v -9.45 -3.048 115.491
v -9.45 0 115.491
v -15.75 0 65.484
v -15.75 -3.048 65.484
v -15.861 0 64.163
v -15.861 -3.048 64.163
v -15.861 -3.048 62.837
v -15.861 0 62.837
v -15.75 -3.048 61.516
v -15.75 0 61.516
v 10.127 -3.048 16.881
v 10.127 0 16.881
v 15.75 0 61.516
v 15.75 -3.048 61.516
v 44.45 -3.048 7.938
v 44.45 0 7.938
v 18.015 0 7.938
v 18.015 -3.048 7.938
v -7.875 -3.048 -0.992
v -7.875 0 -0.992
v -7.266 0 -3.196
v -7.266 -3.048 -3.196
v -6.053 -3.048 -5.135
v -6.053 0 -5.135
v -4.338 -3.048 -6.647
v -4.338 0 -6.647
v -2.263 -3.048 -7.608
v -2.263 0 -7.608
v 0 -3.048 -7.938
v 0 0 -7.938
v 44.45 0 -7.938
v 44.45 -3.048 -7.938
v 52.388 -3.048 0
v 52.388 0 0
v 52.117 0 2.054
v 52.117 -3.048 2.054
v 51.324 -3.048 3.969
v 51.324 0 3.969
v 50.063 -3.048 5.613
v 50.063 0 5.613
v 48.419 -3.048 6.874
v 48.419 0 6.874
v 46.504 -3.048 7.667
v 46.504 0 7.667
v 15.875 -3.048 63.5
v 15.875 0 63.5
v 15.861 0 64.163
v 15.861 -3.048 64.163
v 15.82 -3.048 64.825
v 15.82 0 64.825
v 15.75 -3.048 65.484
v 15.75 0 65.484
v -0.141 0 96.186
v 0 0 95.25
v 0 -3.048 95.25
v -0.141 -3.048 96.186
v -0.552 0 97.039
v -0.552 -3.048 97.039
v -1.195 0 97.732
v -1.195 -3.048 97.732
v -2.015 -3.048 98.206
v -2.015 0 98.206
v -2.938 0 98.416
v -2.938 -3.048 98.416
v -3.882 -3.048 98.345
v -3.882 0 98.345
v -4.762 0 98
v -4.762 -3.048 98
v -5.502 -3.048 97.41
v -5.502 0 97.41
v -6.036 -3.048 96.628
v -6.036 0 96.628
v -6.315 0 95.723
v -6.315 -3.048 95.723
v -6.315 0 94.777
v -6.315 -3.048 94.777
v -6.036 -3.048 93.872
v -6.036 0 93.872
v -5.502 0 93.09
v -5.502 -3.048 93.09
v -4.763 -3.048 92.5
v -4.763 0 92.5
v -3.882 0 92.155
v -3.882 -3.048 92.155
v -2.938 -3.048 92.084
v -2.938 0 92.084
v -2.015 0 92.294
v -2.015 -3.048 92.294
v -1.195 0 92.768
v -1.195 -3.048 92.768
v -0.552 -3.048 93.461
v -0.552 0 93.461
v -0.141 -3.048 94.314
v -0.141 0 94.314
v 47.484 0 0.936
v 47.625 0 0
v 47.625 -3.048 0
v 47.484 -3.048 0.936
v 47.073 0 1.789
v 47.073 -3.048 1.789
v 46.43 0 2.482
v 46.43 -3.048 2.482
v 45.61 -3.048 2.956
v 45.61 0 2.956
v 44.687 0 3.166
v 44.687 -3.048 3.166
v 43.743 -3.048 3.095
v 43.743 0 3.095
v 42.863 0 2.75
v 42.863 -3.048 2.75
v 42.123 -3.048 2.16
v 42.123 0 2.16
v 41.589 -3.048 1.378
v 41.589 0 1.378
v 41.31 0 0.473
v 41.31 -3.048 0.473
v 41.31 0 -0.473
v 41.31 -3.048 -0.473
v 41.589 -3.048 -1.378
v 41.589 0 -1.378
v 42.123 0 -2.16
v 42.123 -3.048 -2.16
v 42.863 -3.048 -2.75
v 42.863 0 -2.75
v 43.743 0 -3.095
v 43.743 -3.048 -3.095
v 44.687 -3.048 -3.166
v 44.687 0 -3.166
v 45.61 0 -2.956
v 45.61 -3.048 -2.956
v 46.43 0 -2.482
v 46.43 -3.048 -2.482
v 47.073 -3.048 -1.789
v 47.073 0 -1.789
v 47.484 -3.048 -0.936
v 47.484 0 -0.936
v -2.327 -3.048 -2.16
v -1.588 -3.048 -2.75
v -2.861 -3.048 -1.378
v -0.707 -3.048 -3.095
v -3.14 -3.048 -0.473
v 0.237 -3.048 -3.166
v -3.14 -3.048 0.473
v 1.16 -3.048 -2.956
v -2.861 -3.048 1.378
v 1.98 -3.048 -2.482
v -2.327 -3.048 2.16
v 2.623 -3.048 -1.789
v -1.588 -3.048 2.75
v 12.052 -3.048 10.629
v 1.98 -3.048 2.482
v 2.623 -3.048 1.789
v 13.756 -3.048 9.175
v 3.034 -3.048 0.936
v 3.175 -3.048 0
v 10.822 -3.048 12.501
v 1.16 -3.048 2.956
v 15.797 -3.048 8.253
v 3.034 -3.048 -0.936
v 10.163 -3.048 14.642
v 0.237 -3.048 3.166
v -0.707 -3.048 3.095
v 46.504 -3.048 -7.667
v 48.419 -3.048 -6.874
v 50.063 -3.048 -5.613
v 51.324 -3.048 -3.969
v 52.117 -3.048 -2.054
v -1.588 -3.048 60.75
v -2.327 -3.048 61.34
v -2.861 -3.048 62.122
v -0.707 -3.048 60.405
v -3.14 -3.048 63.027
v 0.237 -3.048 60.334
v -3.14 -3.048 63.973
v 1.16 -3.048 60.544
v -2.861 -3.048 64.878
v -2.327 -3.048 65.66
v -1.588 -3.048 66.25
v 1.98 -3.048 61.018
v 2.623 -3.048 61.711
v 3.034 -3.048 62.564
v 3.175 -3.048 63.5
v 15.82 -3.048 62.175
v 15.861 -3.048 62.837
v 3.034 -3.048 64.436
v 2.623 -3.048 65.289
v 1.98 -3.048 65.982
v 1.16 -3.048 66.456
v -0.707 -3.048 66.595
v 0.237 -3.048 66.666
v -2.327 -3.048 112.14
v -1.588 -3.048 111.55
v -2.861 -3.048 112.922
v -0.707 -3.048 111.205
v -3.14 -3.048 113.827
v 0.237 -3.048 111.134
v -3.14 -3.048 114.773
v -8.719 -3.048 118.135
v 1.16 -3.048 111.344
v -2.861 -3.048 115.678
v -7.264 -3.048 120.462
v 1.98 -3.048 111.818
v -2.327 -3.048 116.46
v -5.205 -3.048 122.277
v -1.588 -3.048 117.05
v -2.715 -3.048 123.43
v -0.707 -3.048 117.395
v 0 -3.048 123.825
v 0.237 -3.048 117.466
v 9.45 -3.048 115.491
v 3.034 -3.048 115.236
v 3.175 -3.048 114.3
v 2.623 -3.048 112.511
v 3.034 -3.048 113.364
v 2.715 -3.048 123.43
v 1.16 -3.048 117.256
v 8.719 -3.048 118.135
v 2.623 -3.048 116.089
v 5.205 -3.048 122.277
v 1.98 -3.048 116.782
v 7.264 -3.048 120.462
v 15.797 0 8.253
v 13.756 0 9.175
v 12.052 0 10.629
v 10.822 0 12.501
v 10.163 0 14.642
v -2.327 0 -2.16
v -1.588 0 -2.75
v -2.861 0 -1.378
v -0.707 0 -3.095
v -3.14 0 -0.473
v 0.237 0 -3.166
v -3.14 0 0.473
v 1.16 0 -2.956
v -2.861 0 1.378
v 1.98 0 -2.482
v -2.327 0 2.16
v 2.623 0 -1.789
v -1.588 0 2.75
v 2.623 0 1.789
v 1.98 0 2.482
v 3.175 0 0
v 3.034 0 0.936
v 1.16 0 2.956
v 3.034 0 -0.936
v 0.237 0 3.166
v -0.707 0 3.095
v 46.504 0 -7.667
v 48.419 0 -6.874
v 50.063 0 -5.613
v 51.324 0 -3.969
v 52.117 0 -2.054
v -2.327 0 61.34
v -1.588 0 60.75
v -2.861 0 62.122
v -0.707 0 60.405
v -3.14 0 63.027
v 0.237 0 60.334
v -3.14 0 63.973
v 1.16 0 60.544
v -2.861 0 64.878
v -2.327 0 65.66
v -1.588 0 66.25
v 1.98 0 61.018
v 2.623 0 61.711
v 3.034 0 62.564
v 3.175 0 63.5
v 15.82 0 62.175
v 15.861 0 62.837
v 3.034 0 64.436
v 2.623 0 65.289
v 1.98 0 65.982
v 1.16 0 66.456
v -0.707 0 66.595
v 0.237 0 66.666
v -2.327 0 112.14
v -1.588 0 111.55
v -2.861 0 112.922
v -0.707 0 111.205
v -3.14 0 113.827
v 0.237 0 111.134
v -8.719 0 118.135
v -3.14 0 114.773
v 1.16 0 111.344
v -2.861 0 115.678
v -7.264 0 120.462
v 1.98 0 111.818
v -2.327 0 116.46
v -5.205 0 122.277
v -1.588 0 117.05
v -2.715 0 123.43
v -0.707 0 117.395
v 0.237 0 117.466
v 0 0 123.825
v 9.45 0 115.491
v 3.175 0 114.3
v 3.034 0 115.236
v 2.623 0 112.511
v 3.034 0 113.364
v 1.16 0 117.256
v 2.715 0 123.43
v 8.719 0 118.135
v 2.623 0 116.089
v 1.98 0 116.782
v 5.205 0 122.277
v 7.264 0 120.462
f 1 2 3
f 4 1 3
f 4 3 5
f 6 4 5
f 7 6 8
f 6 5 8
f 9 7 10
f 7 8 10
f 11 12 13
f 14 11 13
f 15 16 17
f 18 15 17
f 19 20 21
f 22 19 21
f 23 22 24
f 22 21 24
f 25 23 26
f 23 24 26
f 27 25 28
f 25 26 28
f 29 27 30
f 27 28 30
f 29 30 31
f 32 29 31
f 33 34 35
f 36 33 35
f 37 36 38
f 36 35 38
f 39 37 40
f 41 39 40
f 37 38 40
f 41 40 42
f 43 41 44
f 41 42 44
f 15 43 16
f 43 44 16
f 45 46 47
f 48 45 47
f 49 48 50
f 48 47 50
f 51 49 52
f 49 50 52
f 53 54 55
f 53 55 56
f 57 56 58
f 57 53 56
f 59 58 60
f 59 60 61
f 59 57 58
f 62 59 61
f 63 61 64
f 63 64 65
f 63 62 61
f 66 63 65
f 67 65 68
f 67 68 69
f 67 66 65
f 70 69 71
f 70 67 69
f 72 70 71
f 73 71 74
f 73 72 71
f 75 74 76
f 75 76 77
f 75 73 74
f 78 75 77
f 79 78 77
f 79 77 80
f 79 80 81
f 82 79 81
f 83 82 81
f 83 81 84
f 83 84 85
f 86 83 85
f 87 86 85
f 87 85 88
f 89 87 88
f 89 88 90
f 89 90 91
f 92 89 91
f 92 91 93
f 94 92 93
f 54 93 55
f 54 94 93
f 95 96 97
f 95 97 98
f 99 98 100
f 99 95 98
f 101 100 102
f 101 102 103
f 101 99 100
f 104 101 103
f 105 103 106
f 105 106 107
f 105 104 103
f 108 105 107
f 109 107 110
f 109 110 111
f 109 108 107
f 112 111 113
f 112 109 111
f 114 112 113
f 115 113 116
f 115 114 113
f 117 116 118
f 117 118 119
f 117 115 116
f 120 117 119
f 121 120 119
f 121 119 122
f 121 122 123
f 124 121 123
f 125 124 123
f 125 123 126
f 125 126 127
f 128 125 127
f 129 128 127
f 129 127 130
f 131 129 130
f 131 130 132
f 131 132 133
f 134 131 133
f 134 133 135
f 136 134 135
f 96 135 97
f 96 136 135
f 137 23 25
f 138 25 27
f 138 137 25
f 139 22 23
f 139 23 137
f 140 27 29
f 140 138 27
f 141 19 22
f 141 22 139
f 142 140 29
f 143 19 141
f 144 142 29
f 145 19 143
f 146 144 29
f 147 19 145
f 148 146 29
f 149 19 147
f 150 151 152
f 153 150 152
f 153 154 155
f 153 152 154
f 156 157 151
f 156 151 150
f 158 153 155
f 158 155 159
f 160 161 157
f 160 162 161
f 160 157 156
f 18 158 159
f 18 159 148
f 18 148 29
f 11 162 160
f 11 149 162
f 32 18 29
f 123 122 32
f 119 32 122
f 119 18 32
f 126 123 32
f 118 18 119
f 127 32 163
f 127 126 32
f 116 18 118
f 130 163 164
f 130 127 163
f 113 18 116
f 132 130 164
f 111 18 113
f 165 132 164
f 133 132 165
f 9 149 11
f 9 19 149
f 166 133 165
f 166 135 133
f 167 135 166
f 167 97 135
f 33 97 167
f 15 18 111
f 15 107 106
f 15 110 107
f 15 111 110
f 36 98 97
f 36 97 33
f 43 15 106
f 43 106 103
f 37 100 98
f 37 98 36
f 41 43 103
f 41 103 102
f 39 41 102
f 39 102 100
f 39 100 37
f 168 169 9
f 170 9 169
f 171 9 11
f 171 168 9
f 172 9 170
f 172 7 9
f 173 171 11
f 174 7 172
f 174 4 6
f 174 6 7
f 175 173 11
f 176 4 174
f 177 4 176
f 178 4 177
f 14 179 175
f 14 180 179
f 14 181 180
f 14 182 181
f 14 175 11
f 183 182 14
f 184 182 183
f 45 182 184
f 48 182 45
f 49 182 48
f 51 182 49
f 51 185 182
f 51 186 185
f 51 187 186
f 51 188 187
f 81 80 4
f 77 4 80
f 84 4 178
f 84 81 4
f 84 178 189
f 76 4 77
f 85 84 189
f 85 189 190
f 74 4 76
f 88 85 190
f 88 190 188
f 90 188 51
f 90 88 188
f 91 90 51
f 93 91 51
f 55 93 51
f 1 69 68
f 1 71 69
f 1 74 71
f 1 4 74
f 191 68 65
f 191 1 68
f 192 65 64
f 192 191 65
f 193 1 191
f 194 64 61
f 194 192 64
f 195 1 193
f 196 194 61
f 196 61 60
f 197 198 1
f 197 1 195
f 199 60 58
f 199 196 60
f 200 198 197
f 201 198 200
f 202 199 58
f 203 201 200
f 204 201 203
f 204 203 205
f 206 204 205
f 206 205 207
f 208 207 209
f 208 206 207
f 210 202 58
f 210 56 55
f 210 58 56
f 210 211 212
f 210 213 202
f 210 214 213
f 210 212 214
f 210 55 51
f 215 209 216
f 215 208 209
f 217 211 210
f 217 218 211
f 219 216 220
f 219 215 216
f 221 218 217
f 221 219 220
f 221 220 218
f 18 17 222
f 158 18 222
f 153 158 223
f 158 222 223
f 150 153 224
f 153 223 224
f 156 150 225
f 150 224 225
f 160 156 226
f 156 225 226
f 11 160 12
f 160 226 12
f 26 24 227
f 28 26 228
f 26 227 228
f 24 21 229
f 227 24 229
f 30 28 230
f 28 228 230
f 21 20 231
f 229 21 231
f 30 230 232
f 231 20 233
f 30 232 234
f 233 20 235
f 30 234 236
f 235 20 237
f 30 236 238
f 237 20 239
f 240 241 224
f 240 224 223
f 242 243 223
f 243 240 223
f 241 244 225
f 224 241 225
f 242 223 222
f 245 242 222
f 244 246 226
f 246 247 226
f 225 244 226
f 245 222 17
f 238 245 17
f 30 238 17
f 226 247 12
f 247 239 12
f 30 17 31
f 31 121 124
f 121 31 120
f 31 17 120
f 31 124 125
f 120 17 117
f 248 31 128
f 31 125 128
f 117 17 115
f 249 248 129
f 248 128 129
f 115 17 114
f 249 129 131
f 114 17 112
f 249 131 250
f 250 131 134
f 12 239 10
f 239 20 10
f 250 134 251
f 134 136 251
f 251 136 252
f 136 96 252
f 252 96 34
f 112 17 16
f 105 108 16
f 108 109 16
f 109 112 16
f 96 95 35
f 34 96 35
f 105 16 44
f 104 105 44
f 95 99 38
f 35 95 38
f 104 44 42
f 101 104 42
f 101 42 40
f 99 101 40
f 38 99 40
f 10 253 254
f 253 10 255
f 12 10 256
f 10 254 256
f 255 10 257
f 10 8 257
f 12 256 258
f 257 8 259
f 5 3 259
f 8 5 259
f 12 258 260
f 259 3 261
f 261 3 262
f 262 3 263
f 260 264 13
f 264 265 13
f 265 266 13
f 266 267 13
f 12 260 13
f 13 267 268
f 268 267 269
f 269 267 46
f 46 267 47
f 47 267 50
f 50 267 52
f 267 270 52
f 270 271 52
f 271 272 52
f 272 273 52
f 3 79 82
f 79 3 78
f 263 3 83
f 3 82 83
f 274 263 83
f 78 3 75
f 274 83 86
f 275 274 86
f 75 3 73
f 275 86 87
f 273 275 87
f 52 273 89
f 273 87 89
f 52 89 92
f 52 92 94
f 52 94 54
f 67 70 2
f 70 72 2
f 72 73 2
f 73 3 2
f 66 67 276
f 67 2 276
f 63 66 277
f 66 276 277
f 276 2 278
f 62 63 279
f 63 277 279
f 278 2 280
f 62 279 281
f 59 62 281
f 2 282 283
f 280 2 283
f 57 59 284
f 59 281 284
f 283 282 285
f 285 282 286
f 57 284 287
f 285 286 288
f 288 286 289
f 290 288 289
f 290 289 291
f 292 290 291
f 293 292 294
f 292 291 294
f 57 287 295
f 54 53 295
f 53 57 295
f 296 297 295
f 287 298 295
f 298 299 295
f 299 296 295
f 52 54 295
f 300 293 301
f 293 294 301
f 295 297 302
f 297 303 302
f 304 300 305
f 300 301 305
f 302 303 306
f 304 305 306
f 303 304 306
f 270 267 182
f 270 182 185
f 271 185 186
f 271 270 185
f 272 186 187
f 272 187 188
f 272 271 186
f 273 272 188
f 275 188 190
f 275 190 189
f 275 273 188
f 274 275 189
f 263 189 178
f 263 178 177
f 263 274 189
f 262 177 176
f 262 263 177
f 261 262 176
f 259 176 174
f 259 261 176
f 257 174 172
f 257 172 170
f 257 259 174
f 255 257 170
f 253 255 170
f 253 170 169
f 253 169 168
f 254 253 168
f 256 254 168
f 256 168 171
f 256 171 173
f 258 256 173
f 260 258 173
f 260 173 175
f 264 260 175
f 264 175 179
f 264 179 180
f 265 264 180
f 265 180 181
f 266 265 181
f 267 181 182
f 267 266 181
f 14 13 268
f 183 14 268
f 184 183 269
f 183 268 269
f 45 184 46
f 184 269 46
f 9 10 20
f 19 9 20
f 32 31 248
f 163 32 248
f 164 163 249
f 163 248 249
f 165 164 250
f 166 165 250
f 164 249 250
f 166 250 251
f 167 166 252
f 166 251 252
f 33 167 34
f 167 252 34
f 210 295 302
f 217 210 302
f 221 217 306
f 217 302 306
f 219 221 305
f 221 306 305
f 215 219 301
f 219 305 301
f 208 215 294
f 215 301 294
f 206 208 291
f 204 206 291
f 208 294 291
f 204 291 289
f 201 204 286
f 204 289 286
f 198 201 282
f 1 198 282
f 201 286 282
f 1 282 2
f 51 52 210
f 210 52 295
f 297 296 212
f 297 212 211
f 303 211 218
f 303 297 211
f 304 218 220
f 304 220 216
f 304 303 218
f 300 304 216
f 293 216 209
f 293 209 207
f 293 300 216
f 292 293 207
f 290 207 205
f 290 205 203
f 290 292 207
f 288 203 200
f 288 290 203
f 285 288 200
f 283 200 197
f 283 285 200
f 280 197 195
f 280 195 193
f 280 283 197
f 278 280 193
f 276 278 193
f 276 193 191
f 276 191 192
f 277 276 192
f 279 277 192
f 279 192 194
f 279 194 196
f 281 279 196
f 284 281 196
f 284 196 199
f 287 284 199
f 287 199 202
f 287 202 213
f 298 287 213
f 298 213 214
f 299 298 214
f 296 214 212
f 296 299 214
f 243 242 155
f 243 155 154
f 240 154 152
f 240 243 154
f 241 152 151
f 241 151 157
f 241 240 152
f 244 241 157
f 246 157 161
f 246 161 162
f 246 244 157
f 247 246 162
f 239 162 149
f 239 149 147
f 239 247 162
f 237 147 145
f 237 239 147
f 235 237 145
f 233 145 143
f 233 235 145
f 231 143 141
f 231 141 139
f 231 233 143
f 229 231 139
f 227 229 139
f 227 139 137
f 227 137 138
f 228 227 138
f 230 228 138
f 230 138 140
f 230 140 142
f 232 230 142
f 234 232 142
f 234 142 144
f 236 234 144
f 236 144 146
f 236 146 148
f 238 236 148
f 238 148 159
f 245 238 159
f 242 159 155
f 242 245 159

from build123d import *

# Parameters (mm, degrees)
F0_R     = 3.175
F1_DEPTH = 3.048


with BuildPart() as f1:
    # F0 (on Front) → F1 (new body)
    with BuildSketch(Plane.XZ):
        with BuildLine():
            ThreePointArc((9.450293, 115.490625), (0, 123.825), (-9.450293, 115.490625))
            ThreePointArc((-9.450293, 115.490625), (-0.596483, 104.793695), (9.525, 114.3))
            ThreePointArc((9.525, 114.3), (9.506305, 114.896483), (9.450293, 115.490625))
        make_face()
        with Locations((0, 114.3)):
            Circle(F0_R, mode=Mode.SUBTRACT)
        with BuildLine():
            Line((-9.450293, 115.490625), (-15.750488, 65.484375))
            ThreePointArc((-15.750488, 65.484375), (0, 79.375), (15.750488, 65.484375))
            Line((15.750488, 65.484375), (9.450293, 115.490625))
            ThreePointArc((9.450293, 115.490625), (9.506305, 114.896483), (9.525, 114.3))
            ThreePointArc((9.525, 114.3), (-0.596483, 104.793695), (-9.450293, 115.490625))
        make_face()
        with Locations((-3.175, 95.25)):
            Circle(F0_R, mode=Mode.SUBTRACT)
        with BuildLine():
            ThreePointArc((-15.750488, 65.484375), (-15.875, 63.5), (-15.750488, 61.515625))
            ThreePointArc((-15.750488, 61.515625), (0, 47.625), (15.750488, 61.515625))
            ThreePointArc((15.750488, 61.515625), (15.843841, 62.505861), (15.875, 63.5))
            ThreePointArc((15.875, 63.5), (15.843841, 64.494139), (15.750488, 65.484375))
            ThreePointArc((15.750488, 65.484375), (0, 79.375), (-15.750488, 65.484375))
        make_face()
        with Locations((0, 63.5)):
            Circle(F0_R, mode=Mode.SUBTRACT)
        with BuildLine():
            ThreePointArc((-7.875244, -0.992188), (-0.497069, 7.921921), (7.9375, 0))
            ThreePointArc((7.9375, 0), (5.61266, -5.61266), (0, -7.9375))
            Line((0, -7.9375), (44.45, -7.9375))
            ThreePointArc((44.45, -7.9375), (36.5125, 0), (44.45, 7.9375))
            Line((44.45, 7.9375), (18.014958, 7.9375))
            ThreePointArc((18.014958, 7.9375), (12.052308, 10.629137), (10.127114, 16.881475))
            Line((10.127114, 16.881475), (15.750488, 61.515625))
            ThreePointArc((15.750488, 61.515625), (0, 47.625), (-15.750488, 61.515625))
            Line((-15.750488, 61.515625), (-7.875244, -0.992188))
        make_face()
        with BuildLine():
            ThreePointArc((0, -7.9375), (5.61266, -5.61266), (7.9375, 0))
            ThreePointArc((7.9375, 0), (-0.497069, 7.921921), (-7.875244, -0.992188))
            ThreePointArc((-7.875244, -0.992188), (-5.250163, -5.953125), (0, -7.9375))
        make_face()
        Circle(F0_R, mode=Mode.SUBTRACT)
        with BuildLine():
            ThreePointArc((44.45, 7.9375), (36.5125, 0), (44.45, -7.9375))
            ThreePointArc((44.45, -7.9375), (50.06266, -5.61266), (52.3875, 0))
            ThreePointArc((52.3875, 0), (50.06266, 5.61266), (44.45, 7.9375))
        make_face()
        with Locations((44.45, 0)):
            Circle(F0_R, mode=Mode.SUBTRACT)
    extrude(amount=F1_DEPTH)


solid = f1.part
